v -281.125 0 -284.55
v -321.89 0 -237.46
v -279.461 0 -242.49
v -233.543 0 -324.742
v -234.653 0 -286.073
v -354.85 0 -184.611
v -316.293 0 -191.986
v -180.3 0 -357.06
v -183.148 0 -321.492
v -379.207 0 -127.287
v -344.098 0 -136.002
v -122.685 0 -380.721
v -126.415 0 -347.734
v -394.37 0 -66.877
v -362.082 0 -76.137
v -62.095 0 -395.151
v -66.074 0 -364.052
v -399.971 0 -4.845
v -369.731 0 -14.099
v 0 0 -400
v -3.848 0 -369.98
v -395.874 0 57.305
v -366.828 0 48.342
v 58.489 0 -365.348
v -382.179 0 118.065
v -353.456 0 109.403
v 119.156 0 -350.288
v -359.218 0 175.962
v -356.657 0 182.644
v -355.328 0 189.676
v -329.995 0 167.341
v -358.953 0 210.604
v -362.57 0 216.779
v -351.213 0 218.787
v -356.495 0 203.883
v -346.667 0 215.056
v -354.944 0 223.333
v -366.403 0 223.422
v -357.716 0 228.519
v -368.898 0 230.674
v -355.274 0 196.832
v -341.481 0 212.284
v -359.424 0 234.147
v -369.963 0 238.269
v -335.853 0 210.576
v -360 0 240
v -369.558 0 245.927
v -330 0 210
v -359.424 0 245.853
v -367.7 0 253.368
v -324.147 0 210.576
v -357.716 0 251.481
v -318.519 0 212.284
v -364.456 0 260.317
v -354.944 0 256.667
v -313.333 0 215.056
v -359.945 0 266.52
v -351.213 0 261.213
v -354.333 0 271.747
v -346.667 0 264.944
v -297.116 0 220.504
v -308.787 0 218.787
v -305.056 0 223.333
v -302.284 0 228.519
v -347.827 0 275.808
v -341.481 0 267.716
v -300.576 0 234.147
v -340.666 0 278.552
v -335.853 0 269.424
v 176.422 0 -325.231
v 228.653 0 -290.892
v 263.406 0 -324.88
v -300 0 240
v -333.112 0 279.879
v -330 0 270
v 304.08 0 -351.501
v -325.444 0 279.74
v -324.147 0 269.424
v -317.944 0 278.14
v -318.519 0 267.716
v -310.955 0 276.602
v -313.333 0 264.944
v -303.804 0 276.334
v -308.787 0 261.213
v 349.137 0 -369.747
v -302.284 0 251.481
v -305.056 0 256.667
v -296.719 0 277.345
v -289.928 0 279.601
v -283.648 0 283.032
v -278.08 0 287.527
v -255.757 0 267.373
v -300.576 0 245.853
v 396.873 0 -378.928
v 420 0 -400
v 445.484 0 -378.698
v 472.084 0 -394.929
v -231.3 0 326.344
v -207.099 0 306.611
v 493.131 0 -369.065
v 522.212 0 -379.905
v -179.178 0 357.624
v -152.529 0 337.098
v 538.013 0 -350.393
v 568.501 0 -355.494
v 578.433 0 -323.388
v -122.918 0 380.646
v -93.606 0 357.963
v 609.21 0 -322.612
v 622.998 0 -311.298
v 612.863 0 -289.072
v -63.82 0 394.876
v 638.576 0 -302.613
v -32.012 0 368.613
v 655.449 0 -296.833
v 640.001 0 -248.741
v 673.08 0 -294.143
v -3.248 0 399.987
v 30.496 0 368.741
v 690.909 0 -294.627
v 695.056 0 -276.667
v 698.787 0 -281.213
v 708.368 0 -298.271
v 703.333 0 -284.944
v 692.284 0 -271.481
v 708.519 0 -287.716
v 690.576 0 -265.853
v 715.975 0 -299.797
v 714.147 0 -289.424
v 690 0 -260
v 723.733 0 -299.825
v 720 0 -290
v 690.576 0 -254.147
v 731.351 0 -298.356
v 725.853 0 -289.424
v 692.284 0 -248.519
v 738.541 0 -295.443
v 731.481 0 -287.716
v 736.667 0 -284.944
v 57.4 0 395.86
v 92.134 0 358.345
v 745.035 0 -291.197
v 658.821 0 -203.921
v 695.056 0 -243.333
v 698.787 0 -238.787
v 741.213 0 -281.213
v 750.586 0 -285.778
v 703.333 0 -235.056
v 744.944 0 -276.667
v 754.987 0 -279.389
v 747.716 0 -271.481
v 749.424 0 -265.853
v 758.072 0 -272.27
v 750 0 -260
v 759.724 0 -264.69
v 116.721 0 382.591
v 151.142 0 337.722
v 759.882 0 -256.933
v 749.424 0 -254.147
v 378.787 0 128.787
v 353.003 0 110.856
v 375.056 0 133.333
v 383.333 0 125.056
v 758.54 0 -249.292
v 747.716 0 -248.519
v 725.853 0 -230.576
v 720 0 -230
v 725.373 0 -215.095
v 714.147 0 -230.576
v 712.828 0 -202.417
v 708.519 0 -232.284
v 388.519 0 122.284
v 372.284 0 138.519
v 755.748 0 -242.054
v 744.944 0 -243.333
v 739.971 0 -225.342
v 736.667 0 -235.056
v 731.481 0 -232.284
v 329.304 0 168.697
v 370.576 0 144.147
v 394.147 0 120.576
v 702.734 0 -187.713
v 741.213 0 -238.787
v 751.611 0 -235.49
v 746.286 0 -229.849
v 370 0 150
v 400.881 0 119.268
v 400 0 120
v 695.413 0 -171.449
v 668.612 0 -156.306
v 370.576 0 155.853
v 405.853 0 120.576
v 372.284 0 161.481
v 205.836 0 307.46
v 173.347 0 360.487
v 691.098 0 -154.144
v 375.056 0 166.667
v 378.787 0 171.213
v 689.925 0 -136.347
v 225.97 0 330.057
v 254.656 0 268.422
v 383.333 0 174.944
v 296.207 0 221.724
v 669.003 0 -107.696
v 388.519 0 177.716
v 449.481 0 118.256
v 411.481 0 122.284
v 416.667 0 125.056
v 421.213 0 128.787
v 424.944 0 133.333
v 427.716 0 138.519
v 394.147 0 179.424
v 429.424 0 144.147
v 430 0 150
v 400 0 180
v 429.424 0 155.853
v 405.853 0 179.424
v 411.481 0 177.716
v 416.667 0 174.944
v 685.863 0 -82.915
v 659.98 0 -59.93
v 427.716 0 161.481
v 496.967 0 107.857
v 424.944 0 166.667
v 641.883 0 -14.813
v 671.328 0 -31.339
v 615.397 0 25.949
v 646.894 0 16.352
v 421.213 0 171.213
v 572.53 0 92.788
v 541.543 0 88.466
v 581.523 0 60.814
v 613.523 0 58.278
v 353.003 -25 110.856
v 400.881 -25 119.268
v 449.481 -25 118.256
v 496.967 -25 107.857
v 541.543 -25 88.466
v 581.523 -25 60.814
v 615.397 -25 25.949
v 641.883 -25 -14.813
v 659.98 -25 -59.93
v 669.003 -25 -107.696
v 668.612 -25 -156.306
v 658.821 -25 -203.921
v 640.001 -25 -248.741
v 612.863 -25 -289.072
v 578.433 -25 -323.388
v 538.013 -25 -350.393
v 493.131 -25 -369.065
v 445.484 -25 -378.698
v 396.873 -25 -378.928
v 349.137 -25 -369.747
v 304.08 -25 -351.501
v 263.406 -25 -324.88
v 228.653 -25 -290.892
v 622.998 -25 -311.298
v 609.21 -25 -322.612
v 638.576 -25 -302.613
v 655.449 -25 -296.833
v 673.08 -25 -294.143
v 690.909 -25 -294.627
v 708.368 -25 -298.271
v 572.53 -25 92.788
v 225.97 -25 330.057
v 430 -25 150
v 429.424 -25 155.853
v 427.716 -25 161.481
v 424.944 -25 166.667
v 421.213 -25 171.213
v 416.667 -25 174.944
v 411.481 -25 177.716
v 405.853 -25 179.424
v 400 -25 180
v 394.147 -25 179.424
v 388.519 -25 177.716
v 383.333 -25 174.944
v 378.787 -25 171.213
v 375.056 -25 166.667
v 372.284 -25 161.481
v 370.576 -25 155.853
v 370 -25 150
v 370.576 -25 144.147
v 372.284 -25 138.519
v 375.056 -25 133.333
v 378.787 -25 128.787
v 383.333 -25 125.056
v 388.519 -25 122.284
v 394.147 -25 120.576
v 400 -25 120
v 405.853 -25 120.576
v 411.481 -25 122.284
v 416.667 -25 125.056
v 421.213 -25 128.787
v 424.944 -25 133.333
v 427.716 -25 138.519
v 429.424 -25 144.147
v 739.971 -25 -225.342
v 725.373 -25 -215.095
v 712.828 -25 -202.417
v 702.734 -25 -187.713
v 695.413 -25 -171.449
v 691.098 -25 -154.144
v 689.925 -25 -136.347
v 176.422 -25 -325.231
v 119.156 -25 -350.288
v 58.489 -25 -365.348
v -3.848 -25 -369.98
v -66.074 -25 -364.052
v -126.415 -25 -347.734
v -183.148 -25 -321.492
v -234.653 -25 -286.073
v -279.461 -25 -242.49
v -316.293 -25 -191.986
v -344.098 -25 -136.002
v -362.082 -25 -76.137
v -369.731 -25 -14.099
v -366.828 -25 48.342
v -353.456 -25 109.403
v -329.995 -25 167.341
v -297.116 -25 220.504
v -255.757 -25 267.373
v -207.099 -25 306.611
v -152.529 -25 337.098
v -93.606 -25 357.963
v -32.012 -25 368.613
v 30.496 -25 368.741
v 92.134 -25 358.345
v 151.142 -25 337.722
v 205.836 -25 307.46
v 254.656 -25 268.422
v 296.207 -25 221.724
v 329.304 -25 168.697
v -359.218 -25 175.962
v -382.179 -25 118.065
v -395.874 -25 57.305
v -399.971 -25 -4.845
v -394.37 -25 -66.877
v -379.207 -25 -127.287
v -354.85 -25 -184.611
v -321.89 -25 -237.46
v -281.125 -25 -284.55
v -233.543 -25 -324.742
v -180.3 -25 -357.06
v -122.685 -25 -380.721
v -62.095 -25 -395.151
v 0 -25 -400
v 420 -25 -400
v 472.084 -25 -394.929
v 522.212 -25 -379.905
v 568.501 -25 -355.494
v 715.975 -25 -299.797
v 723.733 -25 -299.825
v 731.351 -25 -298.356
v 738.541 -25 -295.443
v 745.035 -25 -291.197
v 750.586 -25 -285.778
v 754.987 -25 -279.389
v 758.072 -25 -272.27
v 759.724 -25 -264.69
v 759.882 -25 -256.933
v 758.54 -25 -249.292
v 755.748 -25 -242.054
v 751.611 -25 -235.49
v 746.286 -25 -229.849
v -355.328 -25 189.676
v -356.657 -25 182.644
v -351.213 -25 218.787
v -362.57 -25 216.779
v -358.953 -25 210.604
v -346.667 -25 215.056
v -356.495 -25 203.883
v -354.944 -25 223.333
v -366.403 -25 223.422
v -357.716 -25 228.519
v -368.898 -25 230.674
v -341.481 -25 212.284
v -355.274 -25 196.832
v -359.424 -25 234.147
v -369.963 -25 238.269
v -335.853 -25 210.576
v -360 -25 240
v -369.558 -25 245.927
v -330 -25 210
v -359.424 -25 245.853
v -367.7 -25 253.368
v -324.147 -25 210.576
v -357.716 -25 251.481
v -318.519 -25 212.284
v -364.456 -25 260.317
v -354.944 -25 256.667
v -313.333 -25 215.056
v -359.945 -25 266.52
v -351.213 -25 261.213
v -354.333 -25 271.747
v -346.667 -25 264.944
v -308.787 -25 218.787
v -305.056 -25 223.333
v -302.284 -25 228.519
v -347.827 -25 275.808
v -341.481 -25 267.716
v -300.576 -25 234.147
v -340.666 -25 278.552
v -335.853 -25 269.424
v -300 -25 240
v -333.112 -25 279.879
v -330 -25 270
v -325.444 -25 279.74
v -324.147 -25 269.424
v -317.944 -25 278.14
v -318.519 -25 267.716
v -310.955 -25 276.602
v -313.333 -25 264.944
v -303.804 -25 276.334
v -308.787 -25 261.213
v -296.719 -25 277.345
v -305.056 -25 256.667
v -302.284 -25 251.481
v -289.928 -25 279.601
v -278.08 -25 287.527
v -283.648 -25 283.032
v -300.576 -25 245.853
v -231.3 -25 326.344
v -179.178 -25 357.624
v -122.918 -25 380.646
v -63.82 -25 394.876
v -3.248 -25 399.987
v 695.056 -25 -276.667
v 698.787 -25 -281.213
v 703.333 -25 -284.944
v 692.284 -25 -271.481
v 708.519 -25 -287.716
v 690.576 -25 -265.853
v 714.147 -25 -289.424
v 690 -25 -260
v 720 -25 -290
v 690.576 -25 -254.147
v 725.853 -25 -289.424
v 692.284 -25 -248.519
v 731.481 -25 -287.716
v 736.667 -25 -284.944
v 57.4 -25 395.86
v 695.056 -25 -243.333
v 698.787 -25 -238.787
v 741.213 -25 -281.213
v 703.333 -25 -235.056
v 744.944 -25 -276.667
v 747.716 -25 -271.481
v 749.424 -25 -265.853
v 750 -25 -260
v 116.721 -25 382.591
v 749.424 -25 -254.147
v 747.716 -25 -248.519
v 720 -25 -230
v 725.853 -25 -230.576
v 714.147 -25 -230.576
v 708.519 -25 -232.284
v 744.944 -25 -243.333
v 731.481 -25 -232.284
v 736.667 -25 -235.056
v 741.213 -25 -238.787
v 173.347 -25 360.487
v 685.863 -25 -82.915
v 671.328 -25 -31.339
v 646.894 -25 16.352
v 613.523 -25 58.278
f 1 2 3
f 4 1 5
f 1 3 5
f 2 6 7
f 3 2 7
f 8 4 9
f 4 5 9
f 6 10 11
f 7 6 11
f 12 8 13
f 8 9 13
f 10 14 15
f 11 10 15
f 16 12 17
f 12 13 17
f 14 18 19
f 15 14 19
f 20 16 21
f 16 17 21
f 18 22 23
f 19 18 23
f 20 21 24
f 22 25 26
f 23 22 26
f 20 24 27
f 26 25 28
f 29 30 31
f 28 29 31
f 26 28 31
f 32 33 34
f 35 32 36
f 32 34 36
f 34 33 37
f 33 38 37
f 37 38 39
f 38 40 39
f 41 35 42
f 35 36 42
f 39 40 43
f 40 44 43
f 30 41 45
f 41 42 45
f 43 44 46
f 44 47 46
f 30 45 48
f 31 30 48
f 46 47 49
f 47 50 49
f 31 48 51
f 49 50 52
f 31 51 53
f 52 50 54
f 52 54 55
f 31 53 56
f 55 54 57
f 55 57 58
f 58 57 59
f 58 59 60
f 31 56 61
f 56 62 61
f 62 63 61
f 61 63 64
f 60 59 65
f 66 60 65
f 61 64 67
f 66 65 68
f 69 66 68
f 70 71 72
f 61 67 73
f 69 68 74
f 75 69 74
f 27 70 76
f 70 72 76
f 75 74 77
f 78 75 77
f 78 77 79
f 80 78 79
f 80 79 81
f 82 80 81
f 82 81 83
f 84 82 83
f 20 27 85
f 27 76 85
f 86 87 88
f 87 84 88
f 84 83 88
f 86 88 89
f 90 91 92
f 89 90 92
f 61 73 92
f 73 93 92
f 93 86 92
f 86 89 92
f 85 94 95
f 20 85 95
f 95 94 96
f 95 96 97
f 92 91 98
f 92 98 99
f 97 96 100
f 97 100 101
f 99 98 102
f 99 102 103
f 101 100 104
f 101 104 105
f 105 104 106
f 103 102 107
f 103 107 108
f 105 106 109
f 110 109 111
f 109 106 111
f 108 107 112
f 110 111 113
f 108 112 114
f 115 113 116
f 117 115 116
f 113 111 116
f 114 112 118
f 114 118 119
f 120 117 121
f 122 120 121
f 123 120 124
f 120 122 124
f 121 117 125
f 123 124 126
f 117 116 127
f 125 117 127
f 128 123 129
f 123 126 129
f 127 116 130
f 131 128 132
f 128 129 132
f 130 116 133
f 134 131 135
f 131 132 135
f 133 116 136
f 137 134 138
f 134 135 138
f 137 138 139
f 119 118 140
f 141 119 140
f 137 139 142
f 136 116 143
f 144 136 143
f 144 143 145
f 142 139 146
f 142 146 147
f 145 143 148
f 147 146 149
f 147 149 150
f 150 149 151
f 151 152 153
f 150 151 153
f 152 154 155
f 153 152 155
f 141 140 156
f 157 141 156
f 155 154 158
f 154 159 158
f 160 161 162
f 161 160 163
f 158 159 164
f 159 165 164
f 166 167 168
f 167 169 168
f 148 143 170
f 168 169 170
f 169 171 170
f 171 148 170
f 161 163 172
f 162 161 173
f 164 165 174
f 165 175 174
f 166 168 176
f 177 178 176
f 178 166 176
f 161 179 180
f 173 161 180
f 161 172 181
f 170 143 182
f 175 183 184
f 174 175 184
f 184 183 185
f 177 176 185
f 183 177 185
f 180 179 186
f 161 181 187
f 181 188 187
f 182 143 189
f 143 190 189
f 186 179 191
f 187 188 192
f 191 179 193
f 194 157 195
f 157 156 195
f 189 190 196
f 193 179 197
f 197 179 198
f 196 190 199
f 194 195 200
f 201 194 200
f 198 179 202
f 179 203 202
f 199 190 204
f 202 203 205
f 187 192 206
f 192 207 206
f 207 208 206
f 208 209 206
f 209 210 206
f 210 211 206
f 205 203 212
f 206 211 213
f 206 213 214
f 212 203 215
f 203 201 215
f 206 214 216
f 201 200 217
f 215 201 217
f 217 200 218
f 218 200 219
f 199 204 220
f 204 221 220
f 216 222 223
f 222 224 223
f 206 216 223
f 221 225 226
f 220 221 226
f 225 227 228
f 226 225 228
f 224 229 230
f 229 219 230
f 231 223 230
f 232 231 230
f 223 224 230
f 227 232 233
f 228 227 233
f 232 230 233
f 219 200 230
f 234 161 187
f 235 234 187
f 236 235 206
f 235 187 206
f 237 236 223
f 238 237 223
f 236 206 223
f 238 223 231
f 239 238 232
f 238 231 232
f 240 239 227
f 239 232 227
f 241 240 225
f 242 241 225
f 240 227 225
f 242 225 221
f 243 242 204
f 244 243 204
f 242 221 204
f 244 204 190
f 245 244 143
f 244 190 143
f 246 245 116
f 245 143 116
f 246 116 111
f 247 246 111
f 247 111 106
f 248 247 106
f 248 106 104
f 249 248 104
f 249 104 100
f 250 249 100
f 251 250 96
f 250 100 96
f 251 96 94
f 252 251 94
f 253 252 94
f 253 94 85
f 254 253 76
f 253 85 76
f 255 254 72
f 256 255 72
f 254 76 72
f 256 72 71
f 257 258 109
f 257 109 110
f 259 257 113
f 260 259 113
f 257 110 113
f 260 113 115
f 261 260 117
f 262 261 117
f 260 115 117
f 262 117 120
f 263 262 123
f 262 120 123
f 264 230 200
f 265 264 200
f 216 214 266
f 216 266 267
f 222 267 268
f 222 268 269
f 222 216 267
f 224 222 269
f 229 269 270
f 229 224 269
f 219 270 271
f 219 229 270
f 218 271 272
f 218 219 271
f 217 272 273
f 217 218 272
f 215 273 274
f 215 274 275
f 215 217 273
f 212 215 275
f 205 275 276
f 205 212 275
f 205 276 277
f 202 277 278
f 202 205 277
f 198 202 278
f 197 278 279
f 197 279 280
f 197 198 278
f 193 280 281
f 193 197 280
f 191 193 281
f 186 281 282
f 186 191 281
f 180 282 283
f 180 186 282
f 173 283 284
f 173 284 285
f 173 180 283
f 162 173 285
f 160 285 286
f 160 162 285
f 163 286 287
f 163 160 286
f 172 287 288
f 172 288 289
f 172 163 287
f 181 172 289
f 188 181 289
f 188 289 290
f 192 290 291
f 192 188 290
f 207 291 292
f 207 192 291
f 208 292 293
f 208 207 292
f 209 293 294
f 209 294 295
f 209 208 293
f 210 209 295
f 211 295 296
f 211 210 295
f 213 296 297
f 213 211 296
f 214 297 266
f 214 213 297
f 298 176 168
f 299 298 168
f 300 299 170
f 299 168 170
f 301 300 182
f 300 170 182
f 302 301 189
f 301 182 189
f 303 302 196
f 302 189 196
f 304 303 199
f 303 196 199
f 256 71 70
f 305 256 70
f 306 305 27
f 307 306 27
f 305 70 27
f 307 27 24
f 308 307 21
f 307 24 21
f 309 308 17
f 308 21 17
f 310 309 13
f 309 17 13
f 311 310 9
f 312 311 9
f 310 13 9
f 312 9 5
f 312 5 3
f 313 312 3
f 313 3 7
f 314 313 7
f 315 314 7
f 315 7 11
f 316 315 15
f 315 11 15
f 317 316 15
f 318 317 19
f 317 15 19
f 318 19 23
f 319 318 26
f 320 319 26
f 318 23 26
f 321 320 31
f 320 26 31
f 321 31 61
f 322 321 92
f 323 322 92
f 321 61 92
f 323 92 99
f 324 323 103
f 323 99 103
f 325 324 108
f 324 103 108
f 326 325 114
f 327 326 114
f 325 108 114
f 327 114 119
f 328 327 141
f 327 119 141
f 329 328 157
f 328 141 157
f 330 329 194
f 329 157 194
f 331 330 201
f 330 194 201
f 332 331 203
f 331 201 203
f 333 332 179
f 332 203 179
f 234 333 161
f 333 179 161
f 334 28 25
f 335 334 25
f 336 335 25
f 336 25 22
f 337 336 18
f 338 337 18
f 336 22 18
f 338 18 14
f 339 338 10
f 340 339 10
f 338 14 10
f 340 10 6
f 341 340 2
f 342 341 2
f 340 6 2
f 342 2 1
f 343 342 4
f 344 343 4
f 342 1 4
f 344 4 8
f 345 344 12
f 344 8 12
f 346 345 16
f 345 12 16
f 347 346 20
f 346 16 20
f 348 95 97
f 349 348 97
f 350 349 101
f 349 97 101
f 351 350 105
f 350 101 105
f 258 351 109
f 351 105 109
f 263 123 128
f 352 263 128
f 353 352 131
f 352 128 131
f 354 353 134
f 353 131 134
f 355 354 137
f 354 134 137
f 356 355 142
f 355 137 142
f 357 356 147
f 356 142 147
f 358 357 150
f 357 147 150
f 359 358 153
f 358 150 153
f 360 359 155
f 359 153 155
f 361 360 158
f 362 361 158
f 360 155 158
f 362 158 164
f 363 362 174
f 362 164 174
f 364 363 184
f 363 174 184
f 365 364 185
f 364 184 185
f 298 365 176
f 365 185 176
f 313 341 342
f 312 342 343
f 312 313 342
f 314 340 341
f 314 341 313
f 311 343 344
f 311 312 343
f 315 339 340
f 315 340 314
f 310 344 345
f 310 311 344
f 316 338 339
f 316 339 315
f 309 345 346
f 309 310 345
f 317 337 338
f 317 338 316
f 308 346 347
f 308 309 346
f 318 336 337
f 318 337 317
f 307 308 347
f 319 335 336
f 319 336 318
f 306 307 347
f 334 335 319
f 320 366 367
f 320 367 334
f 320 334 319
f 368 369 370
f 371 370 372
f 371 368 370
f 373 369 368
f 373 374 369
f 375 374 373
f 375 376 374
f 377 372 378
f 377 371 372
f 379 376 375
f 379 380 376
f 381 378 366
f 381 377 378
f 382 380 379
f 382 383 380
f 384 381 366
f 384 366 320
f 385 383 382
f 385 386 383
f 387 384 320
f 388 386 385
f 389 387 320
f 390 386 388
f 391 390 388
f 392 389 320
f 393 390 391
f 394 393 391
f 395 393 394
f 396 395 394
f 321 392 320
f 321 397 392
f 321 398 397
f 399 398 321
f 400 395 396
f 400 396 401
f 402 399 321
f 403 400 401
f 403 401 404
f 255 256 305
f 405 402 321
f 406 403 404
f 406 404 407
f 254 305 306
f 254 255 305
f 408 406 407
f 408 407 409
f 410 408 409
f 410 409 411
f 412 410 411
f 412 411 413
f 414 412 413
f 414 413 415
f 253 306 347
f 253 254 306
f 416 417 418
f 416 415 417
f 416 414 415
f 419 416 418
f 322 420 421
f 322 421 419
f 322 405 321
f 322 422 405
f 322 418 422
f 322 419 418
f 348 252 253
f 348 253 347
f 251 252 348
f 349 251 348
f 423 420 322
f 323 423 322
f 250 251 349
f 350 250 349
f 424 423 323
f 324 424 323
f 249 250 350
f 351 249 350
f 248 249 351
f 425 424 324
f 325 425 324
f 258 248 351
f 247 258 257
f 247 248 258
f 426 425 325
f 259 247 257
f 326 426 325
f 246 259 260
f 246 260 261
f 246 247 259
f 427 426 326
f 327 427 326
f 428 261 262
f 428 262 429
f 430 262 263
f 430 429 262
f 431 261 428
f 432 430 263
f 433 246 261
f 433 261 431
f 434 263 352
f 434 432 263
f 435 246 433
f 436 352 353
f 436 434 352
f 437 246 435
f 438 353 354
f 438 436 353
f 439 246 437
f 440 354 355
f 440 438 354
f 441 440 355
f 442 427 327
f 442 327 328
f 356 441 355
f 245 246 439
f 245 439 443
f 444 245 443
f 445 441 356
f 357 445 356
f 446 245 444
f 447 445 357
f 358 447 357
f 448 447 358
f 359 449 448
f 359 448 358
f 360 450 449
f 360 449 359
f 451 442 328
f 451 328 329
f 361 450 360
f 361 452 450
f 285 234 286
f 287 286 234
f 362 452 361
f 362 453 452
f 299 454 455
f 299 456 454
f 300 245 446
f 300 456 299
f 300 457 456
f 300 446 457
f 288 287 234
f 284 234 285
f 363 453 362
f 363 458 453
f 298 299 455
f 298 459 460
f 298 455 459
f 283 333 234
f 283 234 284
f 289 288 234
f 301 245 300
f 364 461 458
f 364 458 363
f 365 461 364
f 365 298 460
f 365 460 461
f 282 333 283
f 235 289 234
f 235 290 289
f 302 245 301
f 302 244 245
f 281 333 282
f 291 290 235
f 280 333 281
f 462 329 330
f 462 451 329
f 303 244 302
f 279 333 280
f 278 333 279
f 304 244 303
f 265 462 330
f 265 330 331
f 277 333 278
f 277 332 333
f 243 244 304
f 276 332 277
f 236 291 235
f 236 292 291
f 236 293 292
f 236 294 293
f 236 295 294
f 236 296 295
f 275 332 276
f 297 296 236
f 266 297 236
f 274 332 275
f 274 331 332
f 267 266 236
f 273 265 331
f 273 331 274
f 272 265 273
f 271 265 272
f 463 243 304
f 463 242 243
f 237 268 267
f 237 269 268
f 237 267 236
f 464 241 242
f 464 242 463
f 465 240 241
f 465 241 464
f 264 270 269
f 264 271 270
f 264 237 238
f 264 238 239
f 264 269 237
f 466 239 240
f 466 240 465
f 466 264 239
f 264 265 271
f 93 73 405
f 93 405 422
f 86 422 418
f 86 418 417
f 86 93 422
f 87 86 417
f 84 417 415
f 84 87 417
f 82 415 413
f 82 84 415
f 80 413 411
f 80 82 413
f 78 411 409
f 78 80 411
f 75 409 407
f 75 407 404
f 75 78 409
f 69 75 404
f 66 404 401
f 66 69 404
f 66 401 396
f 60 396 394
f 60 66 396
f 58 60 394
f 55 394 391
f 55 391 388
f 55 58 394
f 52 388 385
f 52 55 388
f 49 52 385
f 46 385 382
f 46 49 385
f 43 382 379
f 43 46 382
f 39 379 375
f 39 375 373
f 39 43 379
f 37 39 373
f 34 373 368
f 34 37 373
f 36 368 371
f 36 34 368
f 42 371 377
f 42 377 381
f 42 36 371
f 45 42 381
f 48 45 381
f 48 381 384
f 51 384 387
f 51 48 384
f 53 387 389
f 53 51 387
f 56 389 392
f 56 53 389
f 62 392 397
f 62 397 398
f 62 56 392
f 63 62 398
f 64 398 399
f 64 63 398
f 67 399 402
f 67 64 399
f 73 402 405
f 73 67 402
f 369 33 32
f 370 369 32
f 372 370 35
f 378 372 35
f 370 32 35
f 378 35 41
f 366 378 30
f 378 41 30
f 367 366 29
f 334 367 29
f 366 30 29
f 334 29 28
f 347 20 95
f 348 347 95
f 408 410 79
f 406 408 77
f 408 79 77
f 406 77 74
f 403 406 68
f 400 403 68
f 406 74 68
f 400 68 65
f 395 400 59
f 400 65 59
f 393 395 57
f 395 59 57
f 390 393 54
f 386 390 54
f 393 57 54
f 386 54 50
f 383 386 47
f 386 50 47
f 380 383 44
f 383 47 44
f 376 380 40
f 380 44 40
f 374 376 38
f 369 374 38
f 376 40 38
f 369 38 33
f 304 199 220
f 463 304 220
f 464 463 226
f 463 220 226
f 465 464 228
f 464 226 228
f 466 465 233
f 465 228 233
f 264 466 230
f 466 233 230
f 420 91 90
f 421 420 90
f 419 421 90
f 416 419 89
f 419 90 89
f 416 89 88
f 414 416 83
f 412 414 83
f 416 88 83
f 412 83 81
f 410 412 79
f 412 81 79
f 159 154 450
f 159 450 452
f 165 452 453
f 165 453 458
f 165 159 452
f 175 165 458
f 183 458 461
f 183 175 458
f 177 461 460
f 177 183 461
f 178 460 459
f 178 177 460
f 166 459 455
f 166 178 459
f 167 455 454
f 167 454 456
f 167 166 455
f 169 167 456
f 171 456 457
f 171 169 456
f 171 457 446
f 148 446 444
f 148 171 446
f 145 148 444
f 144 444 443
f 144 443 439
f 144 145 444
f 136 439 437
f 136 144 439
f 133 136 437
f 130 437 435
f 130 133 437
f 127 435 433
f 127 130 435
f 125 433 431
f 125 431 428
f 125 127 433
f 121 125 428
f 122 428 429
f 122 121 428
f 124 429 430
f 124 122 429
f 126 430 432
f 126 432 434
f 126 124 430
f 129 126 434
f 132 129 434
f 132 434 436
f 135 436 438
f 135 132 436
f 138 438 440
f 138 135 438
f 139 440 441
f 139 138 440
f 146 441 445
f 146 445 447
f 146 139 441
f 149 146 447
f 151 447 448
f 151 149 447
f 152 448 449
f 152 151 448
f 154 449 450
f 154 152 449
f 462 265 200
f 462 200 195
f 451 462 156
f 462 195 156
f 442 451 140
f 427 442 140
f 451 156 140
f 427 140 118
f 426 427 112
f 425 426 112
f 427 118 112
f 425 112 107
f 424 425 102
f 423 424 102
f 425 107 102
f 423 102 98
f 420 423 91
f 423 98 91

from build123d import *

# Parameters (mm, degrees)
F0_R     = 30
F1_DEPTH = 25


with BuildPart() as f1:
    # F0 (on Front) → F1 (new body)
    with BuildSketch(Plane.XZ):
        with BuildLine():
            ThreePointArc((-362.569757, 216.779084), (-355.273719, 196.83206), (-359.21774, 175.961971))
            ThreePointArc((-359.21774, 175.961971), (-339.40005, -211.678071), (0, -400))
            Line((0, -400), (420, -400))
            ThreePointArc((420, -400), (522.212386, -379.905238), (609.21045, -322.61206))
            ThreePointArc((609.21045, -322.61206), (655.448706, -296.833079), (708.368113, -298.271389))
            ThreePointArc((708.368113, -298.271389), (756.702225, -275.904298), (739.970789, -225.342135))
            ThreePointArc((739.970789, -225.342135), (702.734149, -187.712825), (689.925394, -136.346805))
            ThreePointArc((689.925394, -136.346805), (660.297364, -6.885514), (572.529747, 92.788412))
            Line((572.529747, 92.788412), (225.969995, 330.056906))
            ThreePointArc((225.969995, 330.056906), (-33.631094, 398.583679), (-278.079557, 287.526972))
            ThreePointArc((-278.079557, 287.526972), (-296.71916, 277.344579), (-317.943757, 278.139835))
            ThreePointArc((-317.943757, 278.139835), (-362.349443, 263.526868), (-362.569757, 216.779084))
        make_face()
        with BuildLine():
            ThreePointArc((228.652554, -290.891749), (-353.45578, 109.402979), (353.002904, 110.855536))
            ThreePointArc((353.002904, 110.855536), (658.821473, -203.920932), (228.652554, -290.891749))
        make_face(mode=Mode.SUBTRACT)
        with Locations((720, -260)):
            Circle(F0_R, mode=Mode.SUBTRACT)
        with Locations((-330, 240)):
            Circle(F0_R, mode=Mode.SUBTRACT)
        with Locations((400, 150)):
            Circle(F0_R, mode=Mode.SUBTRACT)
    extrude(amount=F1_DEPTH)


solid = f1.part
